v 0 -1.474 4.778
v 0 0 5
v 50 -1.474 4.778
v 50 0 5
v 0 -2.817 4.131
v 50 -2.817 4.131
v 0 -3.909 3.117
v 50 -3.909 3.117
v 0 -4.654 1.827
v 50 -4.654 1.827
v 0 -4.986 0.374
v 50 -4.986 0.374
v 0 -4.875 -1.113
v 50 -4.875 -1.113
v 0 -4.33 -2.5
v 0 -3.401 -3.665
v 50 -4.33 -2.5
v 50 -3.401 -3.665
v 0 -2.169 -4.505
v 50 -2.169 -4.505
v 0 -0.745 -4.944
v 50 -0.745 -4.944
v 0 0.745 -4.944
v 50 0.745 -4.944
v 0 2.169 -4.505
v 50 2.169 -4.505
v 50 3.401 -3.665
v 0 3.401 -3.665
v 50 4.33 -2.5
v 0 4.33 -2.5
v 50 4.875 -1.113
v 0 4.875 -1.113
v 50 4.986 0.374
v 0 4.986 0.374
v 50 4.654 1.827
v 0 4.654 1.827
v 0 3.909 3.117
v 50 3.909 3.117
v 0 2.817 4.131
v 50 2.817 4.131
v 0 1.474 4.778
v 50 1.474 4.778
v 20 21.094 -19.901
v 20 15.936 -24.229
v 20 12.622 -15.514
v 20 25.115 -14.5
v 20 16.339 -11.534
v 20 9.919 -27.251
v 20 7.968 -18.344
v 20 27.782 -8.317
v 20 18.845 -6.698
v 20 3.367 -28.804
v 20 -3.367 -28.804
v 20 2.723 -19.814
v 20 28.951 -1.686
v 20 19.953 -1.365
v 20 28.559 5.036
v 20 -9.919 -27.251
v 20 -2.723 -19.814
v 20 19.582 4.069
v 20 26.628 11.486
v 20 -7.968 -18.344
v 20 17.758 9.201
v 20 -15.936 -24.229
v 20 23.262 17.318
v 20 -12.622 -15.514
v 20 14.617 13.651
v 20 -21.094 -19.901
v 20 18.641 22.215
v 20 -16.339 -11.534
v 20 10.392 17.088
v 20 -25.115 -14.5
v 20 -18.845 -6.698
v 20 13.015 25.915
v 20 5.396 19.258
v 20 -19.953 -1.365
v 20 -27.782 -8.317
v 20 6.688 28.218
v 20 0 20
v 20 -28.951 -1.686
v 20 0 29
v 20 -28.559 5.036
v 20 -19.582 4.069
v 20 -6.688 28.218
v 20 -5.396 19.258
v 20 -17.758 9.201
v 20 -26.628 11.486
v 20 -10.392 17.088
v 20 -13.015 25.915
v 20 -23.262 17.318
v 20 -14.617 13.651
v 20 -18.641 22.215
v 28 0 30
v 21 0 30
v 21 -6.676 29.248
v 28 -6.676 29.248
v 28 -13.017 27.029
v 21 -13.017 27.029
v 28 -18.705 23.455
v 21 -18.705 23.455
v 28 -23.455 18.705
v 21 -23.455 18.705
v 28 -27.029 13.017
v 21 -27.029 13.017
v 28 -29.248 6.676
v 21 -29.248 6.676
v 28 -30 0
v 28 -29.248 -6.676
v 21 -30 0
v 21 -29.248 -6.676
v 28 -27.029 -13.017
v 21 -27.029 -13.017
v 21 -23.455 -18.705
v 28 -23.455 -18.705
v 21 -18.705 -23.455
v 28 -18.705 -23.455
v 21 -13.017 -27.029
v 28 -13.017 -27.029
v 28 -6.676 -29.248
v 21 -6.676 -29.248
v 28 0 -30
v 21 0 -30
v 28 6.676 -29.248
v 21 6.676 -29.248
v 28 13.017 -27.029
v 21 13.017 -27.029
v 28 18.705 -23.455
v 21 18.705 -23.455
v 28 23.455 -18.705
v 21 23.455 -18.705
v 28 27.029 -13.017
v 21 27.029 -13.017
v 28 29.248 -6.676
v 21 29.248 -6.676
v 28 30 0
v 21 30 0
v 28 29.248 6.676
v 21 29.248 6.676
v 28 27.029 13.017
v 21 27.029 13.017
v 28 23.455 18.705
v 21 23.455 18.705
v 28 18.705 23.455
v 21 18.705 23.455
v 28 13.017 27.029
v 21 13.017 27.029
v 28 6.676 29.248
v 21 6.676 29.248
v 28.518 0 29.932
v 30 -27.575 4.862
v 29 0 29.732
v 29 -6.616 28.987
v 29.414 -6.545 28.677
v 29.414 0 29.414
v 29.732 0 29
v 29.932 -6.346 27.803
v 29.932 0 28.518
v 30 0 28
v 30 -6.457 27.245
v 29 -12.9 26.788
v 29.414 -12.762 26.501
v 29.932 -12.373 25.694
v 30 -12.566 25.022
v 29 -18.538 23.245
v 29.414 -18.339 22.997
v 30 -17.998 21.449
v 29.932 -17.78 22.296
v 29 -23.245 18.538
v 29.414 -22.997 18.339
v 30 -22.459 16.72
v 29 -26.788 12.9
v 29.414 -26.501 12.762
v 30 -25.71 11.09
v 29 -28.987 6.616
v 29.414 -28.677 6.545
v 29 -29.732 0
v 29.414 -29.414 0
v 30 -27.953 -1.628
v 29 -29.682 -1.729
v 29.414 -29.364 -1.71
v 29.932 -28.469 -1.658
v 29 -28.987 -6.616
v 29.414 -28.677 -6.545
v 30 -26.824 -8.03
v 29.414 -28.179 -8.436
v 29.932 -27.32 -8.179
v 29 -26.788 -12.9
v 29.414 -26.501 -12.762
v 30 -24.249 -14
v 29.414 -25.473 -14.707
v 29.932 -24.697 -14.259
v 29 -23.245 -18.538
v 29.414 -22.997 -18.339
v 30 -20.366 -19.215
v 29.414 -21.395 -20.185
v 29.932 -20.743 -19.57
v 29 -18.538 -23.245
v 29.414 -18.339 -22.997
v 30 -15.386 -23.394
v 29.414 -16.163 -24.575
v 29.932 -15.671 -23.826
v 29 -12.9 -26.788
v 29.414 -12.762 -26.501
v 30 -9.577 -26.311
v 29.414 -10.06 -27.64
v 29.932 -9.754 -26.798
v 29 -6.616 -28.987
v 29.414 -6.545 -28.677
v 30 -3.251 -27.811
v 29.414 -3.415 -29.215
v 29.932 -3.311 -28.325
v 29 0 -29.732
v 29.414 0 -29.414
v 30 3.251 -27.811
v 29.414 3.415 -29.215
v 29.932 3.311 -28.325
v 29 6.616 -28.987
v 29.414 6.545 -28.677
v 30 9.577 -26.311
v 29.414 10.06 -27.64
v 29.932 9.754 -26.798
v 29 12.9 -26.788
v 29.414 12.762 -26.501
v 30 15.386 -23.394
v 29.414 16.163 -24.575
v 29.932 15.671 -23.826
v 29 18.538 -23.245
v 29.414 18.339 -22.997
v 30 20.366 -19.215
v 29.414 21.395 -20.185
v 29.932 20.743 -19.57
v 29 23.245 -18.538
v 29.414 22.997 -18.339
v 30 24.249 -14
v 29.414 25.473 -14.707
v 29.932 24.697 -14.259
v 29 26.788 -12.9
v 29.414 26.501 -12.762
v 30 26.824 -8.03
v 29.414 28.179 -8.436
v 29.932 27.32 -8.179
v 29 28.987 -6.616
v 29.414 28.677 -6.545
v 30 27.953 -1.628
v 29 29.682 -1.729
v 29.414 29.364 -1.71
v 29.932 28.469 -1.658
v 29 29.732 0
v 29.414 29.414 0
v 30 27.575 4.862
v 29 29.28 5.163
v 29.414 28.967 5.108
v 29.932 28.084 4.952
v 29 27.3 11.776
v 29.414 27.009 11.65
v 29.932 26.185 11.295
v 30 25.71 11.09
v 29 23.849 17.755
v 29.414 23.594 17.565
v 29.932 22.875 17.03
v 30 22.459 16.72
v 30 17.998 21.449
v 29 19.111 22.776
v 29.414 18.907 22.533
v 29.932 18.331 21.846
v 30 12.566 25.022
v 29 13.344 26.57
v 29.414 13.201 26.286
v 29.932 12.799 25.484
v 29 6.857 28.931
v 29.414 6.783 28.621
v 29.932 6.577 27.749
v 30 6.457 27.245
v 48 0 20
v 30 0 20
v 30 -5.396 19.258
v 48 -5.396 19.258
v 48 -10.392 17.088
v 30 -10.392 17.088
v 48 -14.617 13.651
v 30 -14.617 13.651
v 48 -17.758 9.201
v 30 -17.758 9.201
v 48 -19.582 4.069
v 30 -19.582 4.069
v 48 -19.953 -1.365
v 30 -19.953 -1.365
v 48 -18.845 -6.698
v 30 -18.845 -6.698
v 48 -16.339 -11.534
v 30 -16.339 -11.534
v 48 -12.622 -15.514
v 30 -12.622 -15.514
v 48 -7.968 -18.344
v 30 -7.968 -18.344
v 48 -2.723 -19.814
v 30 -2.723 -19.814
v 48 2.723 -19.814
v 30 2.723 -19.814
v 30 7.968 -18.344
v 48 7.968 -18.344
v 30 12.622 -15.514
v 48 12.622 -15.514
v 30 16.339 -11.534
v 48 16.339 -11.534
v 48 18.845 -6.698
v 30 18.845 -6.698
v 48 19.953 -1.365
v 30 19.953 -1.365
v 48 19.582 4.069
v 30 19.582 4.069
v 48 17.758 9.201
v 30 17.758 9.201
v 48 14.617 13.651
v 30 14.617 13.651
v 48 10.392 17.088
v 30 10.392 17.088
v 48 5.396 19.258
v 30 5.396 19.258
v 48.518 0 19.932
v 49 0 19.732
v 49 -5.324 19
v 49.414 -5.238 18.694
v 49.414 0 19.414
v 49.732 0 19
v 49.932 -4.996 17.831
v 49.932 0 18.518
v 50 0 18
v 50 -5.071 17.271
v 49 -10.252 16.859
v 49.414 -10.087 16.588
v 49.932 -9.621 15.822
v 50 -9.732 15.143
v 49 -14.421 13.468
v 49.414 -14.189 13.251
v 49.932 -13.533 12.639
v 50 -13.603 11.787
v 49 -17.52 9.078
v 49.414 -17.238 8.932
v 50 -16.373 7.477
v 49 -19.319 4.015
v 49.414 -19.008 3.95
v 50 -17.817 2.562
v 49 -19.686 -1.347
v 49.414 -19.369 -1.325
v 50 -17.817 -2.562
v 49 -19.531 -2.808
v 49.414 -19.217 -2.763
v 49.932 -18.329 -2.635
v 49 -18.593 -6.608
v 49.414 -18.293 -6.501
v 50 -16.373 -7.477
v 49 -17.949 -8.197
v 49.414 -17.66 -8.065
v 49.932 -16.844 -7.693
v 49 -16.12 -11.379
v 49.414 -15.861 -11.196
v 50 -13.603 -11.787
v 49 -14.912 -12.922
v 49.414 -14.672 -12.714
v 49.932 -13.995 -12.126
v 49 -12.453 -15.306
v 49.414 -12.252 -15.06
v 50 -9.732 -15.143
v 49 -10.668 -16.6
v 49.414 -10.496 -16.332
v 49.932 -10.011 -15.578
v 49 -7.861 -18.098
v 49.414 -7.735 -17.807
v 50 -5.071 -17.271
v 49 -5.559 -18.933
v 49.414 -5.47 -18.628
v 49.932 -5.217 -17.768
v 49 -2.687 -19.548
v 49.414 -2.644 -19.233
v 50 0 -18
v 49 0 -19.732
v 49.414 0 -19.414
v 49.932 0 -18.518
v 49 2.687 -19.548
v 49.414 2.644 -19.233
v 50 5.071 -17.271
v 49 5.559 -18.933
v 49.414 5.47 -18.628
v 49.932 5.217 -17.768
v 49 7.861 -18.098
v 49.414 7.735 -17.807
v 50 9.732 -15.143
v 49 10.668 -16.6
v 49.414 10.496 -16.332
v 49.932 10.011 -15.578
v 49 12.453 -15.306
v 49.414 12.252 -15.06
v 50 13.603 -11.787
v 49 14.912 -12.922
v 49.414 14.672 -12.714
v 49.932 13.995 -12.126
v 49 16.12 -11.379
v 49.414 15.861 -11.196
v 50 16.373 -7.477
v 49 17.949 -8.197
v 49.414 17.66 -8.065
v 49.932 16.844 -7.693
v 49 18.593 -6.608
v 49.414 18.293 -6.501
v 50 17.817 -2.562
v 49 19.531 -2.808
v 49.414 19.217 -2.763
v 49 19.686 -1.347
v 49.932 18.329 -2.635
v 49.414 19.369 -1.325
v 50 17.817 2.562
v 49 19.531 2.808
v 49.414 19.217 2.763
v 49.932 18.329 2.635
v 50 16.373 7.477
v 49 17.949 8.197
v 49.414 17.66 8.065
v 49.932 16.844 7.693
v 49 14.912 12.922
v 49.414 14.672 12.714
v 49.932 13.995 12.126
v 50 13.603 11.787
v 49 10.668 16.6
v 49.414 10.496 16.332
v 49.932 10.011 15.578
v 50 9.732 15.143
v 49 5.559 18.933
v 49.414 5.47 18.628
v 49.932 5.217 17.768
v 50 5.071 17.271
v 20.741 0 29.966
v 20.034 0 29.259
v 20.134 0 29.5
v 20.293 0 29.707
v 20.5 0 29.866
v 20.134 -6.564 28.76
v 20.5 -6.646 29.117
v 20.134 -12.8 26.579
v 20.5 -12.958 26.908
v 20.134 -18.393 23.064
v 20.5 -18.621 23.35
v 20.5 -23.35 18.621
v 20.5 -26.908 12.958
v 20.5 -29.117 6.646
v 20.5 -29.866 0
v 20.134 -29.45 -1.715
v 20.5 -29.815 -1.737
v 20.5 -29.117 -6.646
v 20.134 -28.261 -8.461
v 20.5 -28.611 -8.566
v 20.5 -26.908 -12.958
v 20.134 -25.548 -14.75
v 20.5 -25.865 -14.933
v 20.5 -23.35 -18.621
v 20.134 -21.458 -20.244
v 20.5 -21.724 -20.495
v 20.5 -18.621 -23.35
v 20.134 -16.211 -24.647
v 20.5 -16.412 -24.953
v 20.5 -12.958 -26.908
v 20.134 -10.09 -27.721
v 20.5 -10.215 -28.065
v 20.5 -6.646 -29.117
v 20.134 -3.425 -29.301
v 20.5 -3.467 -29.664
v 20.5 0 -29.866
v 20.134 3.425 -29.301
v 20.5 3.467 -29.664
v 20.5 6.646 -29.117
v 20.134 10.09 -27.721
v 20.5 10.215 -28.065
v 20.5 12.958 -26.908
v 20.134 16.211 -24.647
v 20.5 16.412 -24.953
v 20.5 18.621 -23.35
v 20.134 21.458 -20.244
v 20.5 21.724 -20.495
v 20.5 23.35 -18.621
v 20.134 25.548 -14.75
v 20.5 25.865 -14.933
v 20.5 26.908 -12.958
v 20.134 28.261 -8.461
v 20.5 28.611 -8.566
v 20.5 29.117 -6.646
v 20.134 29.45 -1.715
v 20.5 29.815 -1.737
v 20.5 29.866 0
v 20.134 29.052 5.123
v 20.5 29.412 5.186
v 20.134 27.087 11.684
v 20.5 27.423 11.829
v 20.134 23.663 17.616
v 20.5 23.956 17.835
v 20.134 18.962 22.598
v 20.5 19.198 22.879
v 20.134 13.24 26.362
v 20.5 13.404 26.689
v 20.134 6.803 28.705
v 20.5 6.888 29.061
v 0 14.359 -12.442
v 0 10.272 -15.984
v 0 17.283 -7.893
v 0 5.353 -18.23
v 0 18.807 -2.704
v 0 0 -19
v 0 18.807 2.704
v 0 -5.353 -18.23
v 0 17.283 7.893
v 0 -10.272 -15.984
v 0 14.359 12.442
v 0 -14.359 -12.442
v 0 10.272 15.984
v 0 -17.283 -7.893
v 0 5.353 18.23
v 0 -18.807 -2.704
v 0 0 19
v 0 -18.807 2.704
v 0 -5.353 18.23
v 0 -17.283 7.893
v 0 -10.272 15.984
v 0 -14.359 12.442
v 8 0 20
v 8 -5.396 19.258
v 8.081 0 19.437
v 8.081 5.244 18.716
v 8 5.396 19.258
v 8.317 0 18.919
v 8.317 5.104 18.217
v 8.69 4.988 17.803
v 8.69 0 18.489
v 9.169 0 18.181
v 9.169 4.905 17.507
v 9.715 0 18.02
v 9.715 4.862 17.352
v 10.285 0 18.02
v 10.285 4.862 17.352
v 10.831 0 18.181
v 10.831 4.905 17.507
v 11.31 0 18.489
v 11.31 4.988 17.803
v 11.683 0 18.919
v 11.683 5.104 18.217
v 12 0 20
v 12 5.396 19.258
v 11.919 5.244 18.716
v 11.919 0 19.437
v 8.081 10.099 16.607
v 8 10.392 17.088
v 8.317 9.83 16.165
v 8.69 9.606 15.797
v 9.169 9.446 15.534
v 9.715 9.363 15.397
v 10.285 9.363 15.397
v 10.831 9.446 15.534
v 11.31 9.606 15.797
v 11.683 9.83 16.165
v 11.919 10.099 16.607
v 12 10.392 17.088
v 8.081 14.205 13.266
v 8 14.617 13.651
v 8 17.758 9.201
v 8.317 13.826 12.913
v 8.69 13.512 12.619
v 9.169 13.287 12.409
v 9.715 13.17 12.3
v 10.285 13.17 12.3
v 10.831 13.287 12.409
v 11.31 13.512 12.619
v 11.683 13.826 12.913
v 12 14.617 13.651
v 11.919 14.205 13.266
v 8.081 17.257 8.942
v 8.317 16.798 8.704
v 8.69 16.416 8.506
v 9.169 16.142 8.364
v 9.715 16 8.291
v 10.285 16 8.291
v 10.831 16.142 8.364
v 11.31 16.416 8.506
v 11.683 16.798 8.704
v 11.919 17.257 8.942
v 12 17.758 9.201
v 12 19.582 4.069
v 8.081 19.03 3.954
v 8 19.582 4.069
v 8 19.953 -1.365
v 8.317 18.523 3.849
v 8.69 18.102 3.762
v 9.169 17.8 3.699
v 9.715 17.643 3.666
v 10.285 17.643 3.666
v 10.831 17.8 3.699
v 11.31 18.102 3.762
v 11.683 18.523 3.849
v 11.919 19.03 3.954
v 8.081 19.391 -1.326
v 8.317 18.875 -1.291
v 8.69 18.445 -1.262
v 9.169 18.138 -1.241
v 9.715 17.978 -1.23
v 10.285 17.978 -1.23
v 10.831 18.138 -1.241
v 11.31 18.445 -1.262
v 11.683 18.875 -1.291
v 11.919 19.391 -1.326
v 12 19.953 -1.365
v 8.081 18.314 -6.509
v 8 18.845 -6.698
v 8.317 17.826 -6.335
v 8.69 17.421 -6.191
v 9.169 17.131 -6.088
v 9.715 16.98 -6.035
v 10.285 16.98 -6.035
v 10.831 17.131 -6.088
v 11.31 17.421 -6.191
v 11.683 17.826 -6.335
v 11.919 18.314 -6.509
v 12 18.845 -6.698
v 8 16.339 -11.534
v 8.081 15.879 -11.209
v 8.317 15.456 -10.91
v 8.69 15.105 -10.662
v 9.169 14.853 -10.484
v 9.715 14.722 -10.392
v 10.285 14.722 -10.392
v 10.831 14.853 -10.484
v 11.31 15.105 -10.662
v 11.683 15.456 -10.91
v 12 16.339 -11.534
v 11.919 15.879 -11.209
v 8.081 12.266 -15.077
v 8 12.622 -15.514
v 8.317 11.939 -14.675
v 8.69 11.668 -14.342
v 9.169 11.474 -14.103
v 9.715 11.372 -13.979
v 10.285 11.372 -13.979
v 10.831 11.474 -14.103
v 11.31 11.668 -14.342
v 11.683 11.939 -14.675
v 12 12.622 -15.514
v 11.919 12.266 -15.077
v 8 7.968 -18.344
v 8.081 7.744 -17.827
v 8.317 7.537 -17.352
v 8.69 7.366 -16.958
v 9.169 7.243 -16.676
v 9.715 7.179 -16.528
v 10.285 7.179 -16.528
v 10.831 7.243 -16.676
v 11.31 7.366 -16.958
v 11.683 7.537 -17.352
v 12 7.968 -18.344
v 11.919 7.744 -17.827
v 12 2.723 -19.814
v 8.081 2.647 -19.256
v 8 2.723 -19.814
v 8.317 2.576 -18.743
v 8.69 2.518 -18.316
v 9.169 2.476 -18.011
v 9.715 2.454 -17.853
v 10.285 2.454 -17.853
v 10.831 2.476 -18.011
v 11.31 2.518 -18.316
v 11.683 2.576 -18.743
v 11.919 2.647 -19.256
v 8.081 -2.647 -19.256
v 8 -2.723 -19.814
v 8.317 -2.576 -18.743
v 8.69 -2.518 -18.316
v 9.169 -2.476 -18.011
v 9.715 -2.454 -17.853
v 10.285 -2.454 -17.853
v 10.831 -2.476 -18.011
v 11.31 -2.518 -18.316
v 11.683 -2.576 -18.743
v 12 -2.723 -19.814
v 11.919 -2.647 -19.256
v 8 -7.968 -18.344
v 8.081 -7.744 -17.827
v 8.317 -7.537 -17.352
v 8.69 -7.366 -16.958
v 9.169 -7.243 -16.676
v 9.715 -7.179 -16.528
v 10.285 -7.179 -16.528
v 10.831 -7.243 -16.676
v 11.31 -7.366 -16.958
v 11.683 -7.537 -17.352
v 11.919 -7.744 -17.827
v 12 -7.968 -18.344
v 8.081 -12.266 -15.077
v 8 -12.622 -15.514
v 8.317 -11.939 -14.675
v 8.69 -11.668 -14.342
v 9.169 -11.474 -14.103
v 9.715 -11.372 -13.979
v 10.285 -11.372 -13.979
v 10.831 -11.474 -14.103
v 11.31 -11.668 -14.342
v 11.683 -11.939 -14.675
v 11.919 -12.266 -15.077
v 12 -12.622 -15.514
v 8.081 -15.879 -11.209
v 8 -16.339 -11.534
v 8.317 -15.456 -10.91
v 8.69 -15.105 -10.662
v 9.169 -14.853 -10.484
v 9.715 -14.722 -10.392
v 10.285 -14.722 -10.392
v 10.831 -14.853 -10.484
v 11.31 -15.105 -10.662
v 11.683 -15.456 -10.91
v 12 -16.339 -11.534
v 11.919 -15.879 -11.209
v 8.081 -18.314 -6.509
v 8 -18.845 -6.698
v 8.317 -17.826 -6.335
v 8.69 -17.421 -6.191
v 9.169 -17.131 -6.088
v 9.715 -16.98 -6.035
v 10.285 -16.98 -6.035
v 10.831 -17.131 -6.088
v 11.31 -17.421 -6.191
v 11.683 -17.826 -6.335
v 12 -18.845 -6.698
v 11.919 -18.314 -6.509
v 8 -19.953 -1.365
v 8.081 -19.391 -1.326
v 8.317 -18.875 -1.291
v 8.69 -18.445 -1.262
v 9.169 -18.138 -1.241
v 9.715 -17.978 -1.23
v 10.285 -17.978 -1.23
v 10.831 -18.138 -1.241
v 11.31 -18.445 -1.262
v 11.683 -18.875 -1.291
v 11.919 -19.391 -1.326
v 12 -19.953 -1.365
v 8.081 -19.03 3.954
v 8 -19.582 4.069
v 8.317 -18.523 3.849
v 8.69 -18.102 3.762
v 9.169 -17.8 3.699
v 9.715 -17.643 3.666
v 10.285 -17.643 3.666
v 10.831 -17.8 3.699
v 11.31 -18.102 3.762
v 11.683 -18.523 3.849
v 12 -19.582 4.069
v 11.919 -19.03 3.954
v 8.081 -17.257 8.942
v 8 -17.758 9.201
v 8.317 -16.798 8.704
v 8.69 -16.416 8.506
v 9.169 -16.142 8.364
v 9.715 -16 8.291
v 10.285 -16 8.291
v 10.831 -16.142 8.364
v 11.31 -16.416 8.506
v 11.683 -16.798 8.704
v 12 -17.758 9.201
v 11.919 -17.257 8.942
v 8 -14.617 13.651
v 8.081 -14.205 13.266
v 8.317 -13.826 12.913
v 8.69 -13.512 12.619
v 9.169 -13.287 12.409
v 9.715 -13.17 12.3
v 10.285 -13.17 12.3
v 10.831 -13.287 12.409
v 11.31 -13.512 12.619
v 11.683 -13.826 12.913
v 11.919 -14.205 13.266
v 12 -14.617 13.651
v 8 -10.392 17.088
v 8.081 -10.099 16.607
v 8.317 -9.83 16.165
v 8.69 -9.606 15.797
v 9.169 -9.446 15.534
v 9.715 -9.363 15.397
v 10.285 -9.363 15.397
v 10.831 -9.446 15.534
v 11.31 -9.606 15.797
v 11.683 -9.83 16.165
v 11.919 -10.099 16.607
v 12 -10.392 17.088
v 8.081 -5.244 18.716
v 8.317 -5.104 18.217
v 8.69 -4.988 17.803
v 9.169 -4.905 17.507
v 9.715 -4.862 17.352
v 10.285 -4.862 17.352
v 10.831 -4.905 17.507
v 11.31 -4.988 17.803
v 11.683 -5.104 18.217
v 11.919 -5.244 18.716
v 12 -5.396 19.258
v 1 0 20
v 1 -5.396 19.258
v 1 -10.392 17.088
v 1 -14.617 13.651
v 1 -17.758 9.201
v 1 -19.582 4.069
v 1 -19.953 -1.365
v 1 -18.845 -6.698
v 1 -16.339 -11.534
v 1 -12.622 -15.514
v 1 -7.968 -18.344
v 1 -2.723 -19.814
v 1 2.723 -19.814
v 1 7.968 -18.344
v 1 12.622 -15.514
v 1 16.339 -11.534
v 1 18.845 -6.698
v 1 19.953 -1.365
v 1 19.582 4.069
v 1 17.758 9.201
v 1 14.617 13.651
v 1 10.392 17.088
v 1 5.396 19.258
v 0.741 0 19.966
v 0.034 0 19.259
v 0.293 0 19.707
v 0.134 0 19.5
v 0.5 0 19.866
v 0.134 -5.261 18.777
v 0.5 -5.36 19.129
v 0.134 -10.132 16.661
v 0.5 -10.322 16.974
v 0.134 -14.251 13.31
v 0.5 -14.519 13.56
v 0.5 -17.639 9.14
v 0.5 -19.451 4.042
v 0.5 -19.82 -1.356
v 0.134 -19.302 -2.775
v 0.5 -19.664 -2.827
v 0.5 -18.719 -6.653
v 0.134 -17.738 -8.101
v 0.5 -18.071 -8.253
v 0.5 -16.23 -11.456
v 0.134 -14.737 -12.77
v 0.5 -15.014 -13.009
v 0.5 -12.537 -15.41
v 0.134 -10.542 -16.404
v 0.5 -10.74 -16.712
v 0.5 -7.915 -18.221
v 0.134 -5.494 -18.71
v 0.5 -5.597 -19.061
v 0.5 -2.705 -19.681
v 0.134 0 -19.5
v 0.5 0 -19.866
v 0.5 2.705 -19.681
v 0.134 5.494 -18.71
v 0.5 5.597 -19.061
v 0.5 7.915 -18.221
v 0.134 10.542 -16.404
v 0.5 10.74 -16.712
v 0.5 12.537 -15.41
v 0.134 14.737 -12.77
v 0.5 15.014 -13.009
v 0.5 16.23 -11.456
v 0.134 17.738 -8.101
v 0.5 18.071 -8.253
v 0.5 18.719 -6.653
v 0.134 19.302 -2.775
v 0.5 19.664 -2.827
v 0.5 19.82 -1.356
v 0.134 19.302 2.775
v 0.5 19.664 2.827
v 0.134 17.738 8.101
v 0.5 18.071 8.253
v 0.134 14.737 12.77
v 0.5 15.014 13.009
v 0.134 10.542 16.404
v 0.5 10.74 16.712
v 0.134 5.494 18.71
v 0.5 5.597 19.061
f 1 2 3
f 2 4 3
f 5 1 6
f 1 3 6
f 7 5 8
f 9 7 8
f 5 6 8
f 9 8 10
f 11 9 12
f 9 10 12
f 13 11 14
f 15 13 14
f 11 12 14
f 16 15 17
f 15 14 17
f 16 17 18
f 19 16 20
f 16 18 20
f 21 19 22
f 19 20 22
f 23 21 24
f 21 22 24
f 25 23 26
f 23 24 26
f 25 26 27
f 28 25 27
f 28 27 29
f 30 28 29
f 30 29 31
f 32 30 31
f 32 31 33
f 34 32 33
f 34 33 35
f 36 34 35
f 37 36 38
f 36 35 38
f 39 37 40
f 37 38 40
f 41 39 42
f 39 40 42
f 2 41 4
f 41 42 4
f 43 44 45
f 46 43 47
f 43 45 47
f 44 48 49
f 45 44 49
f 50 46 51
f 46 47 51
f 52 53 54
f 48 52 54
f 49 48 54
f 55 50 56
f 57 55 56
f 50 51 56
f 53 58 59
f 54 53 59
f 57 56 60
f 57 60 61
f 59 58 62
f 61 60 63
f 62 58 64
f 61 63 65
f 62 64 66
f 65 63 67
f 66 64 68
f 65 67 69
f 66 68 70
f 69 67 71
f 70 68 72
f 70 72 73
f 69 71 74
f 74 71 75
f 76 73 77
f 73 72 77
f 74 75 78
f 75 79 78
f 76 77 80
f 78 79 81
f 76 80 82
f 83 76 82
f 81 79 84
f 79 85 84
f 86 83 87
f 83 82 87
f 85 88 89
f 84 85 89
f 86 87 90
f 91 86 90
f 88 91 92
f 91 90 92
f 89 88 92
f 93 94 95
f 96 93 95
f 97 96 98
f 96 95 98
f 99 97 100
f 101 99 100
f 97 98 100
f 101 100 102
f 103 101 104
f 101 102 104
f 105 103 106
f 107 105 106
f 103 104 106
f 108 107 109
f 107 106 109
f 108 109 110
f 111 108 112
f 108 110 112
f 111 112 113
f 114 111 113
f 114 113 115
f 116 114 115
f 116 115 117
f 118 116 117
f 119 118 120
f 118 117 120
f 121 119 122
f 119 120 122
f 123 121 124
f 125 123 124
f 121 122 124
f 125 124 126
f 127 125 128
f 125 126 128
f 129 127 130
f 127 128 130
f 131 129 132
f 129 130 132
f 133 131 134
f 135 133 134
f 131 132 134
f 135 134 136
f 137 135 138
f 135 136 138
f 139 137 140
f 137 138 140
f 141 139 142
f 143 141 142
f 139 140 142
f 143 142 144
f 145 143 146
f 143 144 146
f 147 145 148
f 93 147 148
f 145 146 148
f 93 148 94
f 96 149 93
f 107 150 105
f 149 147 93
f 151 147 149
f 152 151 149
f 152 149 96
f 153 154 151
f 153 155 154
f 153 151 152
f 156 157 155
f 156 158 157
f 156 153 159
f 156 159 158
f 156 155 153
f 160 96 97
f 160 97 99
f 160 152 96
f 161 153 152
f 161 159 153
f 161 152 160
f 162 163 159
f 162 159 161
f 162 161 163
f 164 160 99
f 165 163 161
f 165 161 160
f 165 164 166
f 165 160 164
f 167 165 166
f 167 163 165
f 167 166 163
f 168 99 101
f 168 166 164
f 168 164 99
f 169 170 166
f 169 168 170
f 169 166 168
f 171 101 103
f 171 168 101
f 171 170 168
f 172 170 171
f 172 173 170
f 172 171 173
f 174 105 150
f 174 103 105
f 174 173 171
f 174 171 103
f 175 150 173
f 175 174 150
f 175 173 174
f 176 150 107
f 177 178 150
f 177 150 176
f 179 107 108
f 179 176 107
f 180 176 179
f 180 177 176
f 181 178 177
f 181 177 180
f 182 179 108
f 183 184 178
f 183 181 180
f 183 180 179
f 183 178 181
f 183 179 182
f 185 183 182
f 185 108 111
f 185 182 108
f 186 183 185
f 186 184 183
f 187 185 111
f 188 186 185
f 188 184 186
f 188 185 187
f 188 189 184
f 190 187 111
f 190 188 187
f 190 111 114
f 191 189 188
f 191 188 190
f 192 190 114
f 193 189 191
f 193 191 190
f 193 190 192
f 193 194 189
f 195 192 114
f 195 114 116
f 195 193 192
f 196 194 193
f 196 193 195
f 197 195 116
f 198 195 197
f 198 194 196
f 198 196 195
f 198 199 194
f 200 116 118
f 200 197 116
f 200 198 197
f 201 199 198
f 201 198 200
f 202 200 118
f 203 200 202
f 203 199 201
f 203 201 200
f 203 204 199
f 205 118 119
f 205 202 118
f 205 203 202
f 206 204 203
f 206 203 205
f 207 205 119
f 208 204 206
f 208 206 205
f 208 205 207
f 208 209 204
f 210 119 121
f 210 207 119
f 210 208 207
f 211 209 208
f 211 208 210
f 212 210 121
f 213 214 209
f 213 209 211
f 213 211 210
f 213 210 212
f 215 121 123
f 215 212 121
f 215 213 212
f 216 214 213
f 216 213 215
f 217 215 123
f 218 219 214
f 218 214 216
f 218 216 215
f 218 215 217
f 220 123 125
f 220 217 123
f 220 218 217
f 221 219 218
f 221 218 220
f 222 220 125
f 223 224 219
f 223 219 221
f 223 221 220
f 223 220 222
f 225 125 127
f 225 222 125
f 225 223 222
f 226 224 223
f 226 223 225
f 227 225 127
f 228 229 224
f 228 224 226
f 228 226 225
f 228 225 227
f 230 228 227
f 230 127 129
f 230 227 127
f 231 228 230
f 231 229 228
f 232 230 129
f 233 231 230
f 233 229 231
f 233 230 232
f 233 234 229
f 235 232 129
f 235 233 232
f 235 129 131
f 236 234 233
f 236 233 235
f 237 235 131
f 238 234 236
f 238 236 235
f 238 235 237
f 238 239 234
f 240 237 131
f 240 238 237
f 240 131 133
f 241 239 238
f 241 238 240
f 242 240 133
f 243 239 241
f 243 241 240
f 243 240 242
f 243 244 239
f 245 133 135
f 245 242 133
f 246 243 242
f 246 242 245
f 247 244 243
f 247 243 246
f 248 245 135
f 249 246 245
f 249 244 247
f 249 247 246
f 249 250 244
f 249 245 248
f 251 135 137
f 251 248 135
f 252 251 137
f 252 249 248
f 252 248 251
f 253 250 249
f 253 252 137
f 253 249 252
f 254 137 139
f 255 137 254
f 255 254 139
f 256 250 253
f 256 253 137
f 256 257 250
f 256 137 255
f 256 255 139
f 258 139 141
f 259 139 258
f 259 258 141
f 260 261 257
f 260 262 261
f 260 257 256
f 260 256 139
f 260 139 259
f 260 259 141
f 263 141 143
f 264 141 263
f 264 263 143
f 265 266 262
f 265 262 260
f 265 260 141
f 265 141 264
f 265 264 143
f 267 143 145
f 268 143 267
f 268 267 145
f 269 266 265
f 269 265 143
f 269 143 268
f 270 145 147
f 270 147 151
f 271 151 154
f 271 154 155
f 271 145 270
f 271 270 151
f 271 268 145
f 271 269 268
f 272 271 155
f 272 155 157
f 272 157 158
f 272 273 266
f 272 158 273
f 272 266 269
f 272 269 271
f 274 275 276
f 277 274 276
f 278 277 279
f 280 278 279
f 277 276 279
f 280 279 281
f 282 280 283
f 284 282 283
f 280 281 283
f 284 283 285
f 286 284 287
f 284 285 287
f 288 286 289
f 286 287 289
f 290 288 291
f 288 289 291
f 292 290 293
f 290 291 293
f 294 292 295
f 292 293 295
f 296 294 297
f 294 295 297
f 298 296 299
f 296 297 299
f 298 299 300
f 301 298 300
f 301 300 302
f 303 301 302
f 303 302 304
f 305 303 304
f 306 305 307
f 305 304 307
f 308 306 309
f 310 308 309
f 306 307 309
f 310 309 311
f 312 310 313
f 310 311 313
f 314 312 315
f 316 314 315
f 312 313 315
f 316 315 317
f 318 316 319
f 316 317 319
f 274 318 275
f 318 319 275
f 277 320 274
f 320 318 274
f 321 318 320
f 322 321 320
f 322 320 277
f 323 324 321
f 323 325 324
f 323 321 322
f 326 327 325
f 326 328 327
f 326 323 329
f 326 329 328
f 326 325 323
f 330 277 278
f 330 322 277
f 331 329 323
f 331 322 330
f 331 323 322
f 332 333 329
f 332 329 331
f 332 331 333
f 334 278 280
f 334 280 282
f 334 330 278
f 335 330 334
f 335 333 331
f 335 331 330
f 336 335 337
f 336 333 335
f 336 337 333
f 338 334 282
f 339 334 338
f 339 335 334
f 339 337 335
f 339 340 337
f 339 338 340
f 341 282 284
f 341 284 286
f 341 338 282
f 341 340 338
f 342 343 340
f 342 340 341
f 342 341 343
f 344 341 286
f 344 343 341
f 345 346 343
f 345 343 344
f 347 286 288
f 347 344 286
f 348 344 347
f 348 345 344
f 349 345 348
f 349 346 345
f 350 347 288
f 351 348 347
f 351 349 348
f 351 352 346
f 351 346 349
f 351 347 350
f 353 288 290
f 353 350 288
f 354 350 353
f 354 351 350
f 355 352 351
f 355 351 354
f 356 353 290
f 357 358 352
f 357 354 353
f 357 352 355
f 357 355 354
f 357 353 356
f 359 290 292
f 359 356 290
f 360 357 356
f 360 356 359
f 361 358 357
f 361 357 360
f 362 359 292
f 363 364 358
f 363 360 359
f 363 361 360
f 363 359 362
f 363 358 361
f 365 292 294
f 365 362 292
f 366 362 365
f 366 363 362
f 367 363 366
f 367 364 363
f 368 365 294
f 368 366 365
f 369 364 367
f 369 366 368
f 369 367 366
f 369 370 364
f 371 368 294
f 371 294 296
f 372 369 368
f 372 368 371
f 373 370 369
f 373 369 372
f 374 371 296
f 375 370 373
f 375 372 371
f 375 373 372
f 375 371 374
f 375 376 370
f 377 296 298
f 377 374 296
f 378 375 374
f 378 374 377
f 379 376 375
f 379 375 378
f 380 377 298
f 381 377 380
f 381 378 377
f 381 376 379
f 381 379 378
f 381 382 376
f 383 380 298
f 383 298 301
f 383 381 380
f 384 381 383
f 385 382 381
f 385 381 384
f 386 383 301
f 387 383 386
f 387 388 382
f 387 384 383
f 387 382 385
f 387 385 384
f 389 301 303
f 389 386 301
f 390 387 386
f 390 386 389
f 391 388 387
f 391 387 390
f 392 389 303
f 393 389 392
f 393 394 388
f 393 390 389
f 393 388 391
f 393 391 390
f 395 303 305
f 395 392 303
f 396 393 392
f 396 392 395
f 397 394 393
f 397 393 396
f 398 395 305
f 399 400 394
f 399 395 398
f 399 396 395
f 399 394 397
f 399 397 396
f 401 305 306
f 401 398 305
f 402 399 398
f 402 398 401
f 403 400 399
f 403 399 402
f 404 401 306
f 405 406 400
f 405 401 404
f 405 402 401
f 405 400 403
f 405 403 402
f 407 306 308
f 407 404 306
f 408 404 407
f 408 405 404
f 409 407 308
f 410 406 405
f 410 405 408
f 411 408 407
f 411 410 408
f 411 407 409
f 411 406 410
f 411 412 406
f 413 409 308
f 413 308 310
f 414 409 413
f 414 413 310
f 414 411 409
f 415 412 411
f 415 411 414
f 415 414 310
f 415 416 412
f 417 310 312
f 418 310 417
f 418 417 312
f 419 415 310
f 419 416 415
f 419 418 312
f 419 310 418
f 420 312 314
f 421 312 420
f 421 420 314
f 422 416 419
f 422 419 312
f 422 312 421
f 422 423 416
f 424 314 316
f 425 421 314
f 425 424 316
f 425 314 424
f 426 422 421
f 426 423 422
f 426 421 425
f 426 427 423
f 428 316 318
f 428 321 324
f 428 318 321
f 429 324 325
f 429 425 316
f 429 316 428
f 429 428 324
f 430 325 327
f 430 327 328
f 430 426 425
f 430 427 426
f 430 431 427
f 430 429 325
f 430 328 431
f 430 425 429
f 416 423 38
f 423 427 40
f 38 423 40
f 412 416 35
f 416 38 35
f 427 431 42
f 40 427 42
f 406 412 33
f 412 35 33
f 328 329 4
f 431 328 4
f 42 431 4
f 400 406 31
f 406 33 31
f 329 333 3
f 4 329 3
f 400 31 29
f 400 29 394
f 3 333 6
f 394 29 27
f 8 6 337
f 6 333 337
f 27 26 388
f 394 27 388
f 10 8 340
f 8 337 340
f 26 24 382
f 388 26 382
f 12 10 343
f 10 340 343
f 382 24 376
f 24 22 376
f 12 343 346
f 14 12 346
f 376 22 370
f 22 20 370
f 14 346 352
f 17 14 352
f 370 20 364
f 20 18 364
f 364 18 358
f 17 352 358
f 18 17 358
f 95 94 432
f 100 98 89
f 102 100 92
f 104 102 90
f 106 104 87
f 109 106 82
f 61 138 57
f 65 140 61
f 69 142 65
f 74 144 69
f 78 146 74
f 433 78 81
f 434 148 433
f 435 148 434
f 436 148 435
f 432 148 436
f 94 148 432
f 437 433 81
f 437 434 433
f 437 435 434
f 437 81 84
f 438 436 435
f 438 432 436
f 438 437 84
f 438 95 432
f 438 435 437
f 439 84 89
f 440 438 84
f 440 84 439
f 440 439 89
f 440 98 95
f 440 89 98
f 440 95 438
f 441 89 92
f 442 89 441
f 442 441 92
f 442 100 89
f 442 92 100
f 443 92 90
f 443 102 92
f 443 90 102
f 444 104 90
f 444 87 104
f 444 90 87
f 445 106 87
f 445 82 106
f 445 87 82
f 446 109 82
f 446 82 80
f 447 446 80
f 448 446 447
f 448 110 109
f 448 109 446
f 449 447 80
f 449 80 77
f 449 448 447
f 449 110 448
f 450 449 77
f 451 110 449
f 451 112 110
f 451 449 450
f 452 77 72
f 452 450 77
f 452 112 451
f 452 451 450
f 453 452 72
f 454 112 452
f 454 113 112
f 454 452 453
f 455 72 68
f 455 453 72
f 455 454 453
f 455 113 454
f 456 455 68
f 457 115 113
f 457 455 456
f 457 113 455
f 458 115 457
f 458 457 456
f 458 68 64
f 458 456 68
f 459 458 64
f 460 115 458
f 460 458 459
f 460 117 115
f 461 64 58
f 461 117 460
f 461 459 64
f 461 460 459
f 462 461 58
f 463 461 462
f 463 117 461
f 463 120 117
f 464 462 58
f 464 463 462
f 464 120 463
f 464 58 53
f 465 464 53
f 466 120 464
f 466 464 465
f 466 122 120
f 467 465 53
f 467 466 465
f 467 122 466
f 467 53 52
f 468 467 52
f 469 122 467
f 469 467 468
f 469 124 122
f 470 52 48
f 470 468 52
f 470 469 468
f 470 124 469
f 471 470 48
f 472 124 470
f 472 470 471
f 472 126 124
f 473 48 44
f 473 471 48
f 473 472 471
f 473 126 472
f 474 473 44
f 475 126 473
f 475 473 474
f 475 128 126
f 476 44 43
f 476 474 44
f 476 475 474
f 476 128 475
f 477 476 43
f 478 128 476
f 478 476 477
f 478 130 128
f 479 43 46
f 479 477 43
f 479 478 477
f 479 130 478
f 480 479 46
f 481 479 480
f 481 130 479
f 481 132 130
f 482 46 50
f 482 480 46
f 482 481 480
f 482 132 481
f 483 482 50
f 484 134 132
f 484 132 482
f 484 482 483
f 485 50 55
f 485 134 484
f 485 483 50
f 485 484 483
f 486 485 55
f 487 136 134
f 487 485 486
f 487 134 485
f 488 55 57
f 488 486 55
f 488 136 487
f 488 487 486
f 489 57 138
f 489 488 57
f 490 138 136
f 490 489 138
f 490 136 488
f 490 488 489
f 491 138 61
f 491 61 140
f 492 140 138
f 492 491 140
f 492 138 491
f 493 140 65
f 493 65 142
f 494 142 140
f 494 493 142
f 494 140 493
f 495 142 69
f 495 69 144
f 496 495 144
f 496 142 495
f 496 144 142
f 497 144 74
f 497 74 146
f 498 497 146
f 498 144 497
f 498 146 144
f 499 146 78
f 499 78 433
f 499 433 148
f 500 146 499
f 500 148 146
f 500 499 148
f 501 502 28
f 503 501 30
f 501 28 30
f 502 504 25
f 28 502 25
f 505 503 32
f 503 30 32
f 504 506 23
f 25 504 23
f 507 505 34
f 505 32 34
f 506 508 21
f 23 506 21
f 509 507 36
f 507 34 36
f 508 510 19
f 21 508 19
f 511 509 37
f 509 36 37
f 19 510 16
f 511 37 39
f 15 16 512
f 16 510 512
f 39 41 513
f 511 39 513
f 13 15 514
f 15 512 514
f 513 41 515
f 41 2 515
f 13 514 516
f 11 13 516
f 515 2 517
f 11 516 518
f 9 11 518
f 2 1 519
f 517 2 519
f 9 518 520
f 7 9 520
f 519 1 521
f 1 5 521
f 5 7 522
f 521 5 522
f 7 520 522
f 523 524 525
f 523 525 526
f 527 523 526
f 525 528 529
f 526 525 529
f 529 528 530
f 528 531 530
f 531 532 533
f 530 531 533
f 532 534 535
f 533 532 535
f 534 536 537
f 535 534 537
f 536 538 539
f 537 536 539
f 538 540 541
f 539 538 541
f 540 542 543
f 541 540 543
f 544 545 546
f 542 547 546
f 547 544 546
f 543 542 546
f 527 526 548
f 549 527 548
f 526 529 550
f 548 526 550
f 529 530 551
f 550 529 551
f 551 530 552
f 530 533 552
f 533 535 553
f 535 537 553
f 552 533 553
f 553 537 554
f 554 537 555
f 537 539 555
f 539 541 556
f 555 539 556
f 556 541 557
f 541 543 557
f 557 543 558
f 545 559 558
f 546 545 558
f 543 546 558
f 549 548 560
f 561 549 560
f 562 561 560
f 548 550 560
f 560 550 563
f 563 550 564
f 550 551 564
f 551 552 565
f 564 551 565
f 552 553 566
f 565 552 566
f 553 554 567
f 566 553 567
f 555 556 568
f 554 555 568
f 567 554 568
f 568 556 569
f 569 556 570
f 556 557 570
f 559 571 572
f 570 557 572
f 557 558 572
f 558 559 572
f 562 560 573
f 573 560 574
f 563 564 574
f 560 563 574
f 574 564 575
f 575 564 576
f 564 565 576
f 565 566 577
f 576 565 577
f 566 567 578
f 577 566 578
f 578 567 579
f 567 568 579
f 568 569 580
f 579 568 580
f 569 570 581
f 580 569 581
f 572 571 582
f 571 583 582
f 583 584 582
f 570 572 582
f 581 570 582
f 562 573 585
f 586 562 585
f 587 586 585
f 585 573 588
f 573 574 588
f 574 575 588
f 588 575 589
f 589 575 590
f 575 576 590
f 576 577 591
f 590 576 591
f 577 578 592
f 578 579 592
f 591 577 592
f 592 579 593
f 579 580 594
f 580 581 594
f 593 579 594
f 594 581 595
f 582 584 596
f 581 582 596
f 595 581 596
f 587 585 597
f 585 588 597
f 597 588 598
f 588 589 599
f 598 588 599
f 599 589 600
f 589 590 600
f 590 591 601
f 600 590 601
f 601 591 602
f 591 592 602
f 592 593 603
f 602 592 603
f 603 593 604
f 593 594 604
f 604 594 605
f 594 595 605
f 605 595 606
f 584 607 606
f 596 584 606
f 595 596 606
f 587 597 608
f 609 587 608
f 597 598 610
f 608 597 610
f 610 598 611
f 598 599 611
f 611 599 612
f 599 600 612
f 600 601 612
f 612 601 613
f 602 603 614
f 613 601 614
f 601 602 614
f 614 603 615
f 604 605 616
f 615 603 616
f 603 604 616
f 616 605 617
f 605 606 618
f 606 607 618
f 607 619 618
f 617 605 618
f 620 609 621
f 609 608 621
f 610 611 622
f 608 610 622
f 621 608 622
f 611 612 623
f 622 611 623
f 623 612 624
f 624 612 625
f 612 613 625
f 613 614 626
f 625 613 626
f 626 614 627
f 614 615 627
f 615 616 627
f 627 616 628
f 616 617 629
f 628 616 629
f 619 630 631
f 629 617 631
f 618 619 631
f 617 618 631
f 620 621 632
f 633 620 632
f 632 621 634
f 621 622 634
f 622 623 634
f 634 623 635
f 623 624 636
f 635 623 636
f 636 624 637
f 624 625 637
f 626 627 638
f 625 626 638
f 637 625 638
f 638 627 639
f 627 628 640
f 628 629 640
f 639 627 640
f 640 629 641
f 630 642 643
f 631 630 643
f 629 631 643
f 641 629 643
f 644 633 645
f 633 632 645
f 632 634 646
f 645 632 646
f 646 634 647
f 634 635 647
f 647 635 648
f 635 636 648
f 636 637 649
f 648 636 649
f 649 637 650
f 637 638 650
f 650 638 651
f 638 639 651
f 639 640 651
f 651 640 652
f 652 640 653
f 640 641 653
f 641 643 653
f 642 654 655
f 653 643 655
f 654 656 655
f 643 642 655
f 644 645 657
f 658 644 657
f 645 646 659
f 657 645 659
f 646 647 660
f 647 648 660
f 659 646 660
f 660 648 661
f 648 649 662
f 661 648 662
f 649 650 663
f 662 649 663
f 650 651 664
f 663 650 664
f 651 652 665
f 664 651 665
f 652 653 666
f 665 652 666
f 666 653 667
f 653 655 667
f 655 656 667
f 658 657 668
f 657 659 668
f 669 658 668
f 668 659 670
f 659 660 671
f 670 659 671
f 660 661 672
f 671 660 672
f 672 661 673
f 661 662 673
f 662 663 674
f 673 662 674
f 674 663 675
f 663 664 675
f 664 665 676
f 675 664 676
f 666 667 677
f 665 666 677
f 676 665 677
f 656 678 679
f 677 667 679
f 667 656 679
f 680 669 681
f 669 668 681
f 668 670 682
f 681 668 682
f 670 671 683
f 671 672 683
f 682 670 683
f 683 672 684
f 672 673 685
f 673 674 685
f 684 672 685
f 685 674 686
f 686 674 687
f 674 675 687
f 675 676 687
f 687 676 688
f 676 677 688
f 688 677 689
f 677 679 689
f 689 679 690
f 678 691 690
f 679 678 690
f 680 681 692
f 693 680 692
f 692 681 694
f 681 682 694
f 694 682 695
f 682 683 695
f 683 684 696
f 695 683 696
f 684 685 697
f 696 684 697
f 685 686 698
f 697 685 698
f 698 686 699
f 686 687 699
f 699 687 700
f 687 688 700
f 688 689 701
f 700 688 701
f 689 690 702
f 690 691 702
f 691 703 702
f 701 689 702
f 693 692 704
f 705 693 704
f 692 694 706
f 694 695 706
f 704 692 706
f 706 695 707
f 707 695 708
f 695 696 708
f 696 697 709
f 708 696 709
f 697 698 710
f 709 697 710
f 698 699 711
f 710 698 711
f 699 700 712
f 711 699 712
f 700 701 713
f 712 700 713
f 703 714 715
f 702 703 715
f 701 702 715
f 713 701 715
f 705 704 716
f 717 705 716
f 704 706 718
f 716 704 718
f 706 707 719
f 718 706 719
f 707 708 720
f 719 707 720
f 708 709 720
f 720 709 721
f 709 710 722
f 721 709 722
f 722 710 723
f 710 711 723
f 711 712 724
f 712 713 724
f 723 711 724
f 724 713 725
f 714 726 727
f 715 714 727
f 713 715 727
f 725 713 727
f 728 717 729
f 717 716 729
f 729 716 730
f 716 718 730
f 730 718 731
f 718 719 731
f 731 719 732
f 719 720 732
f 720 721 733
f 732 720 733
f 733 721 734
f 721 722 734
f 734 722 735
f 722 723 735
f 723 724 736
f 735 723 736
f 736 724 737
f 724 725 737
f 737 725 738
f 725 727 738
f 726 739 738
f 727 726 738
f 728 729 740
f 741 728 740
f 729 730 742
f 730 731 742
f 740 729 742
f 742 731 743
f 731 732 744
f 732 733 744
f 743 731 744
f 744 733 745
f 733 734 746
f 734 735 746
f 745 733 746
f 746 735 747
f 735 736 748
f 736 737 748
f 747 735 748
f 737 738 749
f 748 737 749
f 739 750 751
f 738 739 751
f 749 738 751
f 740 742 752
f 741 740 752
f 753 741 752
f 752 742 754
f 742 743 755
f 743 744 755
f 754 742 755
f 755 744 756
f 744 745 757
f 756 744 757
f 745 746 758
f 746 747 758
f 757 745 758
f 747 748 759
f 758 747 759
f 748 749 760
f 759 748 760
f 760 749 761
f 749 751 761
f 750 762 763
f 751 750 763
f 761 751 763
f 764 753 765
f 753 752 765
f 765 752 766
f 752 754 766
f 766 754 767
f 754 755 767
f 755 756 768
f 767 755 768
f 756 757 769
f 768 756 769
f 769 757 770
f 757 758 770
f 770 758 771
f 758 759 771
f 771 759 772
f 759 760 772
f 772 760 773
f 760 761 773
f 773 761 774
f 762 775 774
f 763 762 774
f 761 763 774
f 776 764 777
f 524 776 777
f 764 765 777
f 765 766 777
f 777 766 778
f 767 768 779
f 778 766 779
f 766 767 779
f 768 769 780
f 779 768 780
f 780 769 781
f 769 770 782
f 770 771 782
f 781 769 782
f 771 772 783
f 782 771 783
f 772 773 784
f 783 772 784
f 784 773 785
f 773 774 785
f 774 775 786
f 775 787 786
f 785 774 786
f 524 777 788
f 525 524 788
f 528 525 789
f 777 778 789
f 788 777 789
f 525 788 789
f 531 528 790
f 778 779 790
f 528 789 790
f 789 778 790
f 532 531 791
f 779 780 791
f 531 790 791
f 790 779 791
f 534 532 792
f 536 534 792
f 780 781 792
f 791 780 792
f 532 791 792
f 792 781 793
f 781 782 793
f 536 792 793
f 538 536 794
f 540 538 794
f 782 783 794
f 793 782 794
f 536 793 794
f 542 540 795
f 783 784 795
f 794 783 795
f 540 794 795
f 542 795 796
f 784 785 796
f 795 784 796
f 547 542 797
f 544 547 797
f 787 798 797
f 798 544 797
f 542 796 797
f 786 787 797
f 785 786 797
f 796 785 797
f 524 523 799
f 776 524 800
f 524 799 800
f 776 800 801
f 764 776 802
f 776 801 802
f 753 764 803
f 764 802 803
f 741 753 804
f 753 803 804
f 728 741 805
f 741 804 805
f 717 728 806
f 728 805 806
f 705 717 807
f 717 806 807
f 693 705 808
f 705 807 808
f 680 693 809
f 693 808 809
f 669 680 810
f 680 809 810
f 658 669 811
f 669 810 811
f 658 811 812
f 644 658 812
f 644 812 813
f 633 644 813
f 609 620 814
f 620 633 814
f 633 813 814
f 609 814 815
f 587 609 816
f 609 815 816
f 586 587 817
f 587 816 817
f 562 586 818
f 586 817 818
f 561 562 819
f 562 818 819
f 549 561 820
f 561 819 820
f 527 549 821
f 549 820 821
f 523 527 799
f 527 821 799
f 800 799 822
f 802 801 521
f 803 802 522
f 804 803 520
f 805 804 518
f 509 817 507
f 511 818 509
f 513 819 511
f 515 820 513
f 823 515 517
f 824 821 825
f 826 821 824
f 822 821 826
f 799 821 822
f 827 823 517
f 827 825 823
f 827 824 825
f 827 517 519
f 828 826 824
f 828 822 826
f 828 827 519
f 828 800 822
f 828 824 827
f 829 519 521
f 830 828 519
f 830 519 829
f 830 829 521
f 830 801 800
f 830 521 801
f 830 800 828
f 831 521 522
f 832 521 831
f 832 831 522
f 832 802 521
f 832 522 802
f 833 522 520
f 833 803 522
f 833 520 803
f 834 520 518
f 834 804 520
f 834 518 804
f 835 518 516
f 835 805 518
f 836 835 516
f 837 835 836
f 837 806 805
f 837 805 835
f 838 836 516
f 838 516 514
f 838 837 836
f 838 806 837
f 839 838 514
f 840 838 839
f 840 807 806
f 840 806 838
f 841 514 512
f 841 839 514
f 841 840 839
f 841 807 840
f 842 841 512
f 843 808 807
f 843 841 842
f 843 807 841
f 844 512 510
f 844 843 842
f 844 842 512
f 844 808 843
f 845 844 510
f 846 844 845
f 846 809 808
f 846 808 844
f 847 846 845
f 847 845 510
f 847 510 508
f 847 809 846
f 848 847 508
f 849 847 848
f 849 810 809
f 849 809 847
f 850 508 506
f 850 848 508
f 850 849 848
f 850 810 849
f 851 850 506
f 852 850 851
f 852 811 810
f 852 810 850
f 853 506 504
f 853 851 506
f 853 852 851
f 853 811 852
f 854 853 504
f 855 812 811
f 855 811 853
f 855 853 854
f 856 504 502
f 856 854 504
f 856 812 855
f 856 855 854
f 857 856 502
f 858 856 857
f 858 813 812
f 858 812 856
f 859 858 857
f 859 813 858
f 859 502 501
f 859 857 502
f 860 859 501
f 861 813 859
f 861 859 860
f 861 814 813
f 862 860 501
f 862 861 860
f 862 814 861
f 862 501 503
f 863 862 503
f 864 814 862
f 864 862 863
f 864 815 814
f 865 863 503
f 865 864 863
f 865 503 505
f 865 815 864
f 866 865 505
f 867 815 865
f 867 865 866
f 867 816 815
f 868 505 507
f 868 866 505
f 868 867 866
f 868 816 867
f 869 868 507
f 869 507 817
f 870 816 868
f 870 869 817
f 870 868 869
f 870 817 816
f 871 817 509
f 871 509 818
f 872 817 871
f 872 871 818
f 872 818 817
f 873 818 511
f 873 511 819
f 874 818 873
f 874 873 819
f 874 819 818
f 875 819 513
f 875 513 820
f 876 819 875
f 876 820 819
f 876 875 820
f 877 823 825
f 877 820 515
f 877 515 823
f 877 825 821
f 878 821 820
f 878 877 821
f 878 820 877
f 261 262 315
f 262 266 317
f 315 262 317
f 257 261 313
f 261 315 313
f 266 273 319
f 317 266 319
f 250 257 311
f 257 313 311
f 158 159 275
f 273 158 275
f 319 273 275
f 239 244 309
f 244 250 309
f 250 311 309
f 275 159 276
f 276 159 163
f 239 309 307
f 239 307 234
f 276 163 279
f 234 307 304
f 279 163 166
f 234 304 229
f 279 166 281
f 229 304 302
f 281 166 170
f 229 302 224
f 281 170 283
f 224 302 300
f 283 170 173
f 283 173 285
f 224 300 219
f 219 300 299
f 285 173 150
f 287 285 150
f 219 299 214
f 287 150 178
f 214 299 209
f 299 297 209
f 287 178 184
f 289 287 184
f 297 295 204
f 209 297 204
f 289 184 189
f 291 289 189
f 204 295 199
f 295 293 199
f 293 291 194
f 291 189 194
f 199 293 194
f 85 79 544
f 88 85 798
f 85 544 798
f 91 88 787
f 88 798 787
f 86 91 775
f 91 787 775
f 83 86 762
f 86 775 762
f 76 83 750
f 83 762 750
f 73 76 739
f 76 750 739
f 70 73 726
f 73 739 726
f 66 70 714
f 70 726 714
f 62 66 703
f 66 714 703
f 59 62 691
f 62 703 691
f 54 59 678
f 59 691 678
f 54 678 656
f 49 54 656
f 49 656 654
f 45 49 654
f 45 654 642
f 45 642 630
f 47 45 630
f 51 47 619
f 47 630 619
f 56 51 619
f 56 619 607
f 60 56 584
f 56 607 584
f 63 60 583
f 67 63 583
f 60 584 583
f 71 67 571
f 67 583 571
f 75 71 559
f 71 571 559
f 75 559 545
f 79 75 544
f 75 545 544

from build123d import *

# Parameters (mm, degrees)
SKICA2_R    = 2
ZAOBLIT8_R  = 1
ZAOBLIT9_R  = 1
ZAOBLIT10_R = 2
ZAOBLIT11_R = 2


with BuildPart() as part:
    # Skica1 → Rotovat1 (revolve)
    with BuildSketch(Plane.XY, mode=Mode.PRIVATE) as rotovat1_sk:
        Polygon((0, 5), (50, 5), (50, 20), (30, 20), (30, 30), (20, 30), (20, 20), (0, 20), align=None)
    revolve(rotovat1_sk.sketch.rotate(Axis((0, 0, 0), (1, 0, 0)), 90), axis=Axis((0, 0, 0), (1, 0, 0)))

    # Skica2 → Odebrat rotací1 (revolve, cut)
    with BuildSketch(Plane.XY, mode=Mode.PRIVATE) as odebrat_rotac_1_sk:
        with Locations((10, 20)):
            Circle(SKICA2_R)
    revolve(odebrat_rotac_1_sk.sketch.rotate(Axis((0, 0, 0), (-1, 0, 0)), 270), axis=Axis((0, 0, 0), (-1, 0, 0)), mode=Mode.SUBTRACT)

    # Zaoblit8
    zaoblit8_edges = [part.edges().sort_by_distance(p)[0] for p in [
        (0, 0, -20),
    ]]
    fillet(zaoblit8_edges, radius=ZAOBLIT8_R)

    # Zaoblit9
    zaoblit9_edges = [part.edges().sort_by_distance(p)[0] for p in [
        (20, 0, -30),
    ]]
    fillet(zaoblit9_edges, radius=ZAOBLIT9_R)

    # Zaoblit10
    zaoblit10_edges = [part.edges().sort_by_distance(p)[0] for p in [
        (30, 0, -30),
    ]]
    fillet(zaoblit10_edges, radius=ZAOBLIT10_R)

    # Zaoblit11
    zaoblit11_edges = [part.edges().sort_by_distance(p)[0] for p in [
        (50, 0, -20),
    ]]
    fillet(zaoblit11_edges, radius=ZAOBLIT11_R)


solid = part.part
